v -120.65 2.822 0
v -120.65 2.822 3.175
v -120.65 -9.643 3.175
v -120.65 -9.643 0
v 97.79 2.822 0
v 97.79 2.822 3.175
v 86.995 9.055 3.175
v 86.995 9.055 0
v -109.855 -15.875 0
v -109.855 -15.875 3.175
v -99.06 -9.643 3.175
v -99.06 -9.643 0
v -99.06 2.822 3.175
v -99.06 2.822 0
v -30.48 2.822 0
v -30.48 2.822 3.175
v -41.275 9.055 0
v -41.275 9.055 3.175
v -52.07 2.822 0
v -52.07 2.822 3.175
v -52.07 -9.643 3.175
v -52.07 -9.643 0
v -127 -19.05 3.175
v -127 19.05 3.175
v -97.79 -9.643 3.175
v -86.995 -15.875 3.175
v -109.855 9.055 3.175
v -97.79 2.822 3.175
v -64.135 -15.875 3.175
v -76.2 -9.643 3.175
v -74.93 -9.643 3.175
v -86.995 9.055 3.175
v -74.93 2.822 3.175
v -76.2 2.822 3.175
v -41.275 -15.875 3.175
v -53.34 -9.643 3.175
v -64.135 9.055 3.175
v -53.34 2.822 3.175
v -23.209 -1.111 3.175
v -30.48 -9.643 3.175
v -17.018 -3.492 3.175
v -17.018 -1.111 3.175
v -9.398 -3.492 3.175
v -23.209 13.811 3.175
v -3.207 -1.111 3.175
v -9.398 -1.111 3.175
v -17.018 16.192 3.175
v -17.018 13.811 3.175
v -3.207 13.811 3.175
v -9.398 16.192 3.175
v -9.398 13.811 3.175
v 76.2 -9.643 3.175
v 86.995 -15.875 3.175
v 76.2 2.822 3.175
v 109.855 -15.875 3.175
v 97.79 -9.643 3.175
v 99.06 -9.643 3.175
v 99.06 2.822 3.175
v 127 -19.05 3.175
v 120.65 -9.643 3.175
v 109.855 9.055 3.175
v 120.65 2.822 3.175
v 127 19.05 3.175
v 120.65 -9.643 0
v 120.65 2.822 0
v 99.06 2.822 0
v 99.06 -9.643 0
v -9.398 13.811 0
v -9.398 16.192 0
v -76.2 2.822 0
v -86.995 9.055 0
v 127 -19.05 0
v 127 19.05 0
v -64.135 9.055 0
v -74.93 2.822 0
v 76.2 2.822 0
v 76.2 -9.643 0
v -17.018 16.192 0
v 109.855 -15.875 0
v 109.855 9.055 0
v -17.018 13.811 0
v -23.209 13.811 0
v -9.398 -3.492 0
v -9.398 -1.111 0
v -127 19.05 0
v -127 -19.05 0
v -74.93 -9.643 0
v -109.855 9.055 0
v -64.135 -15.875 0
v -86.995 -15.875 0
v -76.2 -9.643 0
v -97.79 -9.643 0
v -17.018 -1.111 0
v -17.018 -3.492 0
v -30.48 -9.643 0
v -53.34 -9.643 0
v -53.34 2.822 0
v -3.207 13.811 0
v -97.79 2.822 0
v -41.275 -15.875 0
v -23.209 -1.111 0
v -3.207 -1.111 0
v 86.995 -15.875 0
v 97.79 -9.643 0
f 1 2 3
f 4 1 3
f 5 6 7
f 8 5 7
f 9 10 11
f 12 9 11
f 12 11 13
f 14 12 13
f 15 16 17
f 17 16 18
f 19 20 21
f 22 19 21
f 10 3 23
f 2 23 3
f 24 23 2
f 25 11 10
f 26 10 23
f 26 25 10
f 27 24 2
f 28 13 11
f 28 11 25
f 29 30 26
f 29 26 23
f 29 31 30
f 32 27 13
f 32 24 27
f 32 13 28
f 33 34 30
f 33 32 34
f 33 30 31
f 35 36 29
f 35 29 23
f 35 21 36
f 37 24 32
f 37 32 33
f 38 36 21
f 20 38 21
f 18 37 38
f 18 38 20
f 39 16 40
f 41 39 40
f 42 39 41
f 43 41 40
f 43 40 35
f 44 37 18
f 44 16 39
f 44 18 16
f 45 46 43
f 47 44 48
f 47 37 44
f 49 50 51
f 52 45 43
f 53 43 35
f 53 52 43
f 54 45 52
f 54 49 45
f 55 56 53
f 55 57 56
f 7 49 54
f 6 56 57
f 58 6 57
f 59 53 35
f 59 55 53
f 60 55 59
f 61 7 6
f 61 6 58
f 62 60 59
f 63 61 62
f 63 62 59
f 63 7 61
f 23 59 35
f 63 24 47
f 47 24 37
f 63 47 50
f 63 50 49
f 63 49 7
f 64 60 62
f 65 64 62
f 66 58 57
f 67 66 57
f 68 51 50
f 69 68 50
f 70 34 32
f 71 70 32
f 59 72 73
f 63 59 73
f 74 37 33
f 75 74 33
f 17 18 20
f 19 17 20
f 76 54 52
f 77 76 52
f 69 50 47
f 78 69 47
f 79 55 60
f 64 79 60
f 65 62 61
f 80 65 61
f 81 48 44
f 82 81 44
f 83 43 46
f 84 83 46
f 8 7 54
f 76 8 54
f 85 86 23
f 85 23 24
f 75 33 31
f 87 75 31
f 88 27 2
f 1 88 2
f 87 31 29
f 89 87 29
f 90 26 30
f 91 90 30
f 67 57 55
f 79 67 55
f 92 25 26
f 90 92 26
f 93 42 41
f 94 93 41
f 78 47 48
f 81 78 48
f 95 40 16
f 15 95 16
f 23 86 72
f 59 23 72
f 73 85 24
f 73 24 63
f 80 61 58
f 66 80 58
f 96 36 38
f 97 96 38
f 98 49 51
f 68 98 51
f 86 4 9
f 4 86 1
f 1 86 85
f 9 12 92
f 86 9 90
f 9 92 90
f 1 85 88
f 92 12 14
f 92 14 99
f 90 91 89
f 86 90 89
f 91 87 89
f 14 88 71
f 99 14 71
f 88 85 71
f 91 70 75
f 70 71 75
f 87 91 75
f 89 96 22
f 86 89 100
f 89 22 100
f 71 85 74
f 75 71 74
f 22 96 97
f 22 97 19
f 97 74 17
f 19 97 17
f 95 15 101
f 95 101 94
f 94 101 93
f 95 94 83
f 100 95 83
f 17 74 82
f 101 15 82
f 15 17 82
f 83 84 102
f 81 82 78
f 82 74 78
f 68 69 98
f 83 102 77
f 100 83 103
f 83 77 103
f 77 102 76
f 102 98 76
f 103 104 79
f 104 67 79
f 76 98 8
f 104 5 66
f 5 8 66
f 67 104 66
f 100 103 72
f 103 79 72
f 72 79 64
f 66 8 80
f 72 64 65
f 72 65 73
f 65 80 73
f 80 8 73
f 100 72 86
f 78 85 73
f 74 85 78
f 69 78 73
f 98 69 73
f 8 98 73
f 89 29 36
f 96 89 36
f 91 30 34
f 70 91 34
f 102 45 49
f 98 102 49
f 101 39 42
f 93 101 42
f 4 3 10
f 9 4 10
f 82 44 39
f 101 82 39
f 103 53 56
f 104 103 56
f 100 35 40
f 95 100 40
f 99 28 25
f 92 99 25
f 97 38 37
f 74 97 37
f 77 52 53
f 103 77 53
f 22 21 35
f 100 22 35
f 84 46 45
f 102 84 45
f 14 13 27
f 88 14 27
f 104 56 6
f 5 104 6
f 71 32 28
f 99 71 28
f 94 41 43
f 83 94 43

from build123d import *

# Parameters (mm, degrees)
SKETCH1_W           = 254
SKETCH1_H           = 38.1
BOSS_EXTRUDE1_DEPTH = 3.175
CUT_EXTRUDE1_DEPTH  = 10.414
CUT_EXTRUDE2_DEPTH  = 3.175


with BuildPart() as part:
    # Sketch1 → Boss-Extrude1 (new body)
    with BuildSketch(Plane.XY):
        Rectangle(SKETCH1_W, SKETCH1_H)
    extrude(amount=BOSS_EXTRUDE1_DEPTH)

    # Sketch4 → Cut-Extrude1 (cut)
    with BuildSketch(Plane.XY.offset(3.175)):
        Polygon((-99.060120052, -9.6425385), (-99.060120052, 2.8223845), (-109.855060026, 9.054846), (-120.65, 2.8223845), (-120.65, -9.6425385), (-109.855060026, -15.875), align=None)
        Polygon((-76.200120052, -9.6425385), (-76.200120052, 2.8223845), (-86.995060026, 9.054846), (-97.79, 2.8223845), (-97.79, -9.6425385), (-86.995060026, -15.875), align=None)
        Polygon((-53.340120052, -9.6425385), (-53.340120052, 2.8223845), (-64.135060026, 9.054846), (-74.93, 2.8223845), (-74.93, -9.6425385), (-64.135060026, -15.875), align=None)
        Polygon((-30.480120052, -9.6425385), (-30.480120052, 2.8223845), (-41.275060026, 9.054846), (-52.07, 2.8223845), (-52.07, -9.6425385), (-41.275060026, -15.875), align=None)
        Polygon((120.65, -9.6425385), (120.65, 2.8223845), (109.855060026, 9.054846), (99.060120052, 2.8223845), (99.060120052, -9.6425385), (109.855060026, -15.875), align=None)
        Polygon((97.79, -9.6425385), (97.79, 2.8223845), (86.995060026, 9.054846), (76.200120052, 2.8223845), (76.200120052, -9.6425385), (86.995060026, -15.875), align=None)
    extrude(amount=-CUT_EXTRUDE1_DEPTH, mode=Mode.SUBTRACT)

    # Sketch2 → Cut-Extrude2 (cut)
    with BuildSketch(Plane.XY.offset(3.175)):
        Polygon((-3.20675, -1.11125), (-3.20675, 13.81125), (-9.398, 13.81125), (-9.398, 16.1925), (-17.018, 16.1925), (-17.018, 13.81125), (-23.20925, 13.81125), (-23.20925, -1.11125), (-17.018, -1.11125), (-17.018, -3.4925), (-9.398, -3.4925), (-9.398, -1.11125), align=None)
    extrude(amount=-CUT_EXTRUDE2_DEPTH, mode=Mode.SUBTRACT)


solid = part.part
